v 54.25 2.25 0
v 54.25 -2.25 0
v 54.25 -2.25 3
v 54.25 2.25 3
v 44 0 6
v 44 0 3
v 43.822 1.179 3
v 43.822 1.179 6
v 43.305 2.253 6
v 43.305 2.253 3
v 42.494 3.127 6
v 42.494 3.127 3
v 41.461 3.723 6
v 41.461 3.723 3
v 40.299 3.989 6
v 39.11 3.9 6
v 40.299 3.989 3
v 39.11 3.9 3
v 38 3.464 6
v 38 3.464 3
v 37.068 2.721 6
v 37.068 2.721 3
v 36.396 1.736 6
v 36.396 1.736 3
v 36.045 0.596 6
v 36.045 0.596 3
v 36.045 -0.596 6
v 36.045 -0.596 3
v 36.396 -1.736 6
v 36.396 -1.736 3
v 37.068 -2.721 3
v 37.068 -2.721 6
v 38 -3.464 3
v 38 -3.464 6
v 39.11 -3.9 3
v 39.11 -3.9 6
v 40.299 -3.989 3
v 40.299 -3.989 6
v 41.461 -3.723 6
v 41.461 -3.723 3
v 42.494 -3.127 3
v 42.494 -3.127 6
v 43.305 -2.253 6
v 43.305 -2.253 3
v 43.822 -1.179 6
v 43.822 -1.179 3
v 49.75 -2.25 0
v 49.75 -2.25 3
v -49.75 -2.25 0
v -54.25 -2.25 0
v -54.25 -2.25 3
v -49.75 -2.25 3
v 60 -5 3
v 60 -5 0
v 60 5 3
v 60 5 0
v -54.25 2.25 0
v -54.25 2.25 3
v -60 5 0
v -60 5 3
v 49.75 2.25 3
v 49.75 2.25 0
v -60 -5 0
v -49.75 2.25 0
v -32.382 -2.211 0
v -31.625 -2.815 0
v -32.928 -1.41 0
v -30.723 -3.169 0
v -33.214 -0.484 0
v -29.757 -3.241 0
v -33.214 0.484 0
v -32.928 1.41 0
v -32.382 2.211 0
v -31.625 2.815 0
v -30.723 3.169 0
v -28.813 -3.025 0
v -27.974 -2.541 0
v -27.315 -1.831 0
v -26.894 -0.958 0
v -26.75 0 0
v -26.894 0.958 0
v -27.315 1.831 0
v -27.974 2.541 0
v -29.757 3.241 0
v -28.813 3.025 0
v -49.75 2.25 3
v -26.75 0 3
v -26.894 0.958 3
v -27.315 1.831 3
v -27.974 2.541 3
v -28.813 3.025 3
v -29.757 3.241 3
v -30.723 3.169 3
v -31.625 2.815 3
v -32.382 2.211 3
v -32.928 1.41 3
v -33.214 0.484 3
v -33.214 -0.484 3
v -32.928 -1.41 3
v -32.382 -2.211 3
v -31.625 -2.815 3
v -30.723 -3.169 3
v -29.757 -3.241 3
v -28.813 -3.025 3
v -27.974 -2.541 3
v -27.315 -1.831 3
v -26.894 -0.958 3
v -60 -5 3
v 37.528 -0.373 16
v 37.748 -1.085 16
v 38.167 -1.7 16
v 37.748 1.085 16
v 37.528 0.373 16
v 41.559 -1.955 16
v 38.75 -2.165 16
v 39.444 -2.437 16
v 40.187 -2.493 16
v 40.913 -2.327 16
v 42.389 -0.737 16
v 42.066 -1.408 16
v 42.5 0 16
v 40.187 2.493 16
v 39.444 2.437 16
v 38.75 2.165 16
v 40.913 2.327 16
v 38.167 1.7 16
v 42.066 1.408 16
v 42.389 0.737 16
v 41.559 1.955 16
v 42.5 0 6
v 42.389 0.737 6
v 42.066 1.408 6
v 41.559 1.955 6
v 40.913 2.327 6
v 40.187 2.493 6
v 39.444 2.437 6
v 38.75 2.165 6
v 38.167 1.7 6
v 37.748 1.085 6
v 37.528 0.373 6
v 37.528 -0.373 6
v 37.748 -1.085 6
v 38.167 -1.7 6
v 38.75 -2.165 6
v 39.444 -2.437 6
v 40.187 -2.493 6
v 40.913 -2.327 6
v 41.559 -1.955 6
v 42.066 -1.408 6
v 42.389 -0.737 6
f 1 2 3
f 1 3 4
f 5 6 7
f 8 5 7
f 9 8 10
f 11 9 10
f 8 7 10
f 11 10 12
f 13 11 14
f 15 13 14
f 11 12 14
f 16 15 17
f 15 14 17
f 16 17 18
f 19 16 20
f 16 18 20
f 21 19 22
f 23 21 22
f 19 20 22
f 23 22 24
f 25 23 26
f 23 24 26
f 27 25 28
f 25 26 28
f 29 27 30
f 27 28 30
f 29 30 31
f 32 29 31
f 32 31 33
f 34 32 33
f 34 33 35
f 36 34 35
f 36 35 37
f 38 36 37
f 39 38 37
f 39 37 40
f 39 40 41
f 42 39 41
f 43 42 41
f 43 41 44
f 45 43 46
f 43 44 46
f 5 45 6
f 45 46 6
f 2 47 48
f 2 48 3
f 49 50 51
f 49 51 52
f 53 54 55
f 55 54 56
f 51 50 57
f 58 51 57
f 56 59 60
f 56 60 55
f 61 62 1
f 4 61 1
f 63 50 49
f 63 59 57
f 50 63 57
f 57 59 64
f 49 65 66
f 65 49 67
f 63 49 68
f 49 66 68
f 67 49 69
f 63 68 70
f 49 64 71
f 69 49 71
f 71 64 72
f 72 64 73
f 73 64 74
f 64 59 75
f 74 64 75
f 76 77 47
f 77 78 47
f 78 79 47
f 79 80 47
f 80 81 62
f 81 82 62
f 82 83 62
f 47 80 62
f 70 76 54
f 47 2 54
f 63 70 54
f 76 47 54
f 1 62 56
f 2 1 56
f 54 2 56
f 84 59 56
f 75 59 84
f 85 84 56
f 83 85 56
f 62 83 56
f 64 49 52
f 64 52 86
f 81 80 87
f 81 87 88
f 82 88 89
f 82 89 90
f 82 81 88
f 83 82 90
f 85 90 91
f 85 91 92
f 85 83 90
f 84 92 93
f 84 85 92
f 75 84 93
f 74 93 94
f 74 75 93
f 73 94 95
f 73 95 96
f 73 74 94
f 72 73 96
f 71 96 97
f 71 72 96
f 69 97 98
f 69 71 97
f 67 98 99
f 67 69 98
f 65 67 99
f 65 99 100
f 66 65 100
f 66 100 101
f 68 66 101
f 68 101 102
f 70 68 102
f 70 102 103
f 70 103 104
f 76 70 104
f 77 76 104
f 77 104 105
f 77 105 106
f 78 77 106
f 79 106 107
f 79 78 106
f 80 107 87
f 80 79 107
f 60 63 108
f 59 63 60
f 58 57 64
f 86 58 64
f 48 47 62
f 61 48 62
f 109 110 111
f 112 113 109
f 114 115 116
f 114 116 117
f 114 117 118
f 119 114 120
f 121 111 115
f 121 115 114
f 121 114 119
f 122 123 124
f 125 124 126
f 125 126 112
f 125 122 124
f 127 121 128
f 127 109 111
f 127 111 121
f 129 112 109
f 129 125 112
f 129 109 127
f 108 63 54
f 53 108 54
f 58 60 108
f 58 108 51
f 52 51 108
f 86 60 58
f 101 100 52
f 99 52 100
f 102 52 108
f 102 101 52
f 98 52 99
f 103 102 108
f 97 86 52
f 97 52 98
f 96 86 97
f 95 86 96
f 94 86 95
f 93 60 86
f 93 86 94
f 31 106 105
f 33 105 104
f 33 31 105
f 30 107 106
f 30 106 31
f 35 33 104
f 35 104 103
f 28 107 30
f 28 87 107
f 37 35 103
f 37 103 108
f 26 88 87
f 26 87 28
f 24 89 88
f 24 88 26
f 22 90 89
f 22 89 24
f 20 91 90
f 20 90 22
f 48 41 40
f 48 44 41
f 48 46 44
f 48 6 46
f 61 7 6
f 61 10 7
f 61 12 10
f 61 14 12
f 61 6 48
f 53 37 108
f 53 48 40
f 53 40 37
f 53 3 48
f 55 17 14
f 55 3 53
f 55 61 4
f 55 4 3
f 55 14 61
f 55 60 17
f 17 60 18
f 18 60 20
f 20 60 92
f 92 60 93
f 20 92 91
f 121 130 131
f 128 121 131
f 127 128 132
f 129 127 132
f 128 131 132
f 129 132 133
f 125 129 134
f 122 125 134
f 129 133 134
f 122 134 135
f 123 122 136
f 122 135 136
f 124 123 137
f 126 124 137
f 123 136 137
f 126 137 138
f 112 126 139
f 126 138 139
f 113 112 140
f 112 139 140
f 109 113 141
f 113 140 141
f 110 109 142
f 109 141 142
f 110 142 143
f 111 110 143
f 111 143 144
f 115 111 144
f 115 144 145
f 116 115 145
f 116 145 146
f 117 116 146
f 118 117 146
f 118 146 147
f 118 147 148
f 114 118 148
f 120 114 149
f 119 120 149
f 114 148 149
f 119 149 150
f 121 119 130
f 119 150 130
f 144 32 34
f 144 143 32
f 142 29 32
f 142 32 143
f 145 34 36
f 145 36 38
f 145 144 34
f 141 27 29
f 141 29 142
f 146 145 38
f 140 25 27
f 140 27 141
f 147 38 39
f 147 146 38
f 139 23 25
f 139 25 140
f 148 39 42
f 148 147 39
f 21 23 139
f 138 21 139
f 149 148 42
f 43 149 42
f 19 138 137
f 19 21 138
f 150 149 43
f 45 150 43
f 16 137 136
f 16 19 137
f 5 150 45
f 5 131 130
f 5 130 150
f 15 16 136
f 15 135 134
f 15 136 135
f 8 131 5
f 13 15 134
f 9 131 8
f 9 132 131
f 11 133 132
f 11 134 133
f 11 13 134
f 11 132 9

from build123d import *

# Parameters (mm, degrees)
F0_W     = 120
F0_H     = 10
F0_W_2   = 4.5
F0_H_2   = 4.5
F0_R     = 3.25
F1_DEPTH = 3
F2_R     = 4
F3_DEPTH = 3
F4_R     = 2.5
F5_DEPTH = 10


with BuildPart() as f1:
    # F0 (on Top) → F1 (new body)
    with BuildSketch(Plane.XY):
        Rectangle(F0_W, F0_H)
        with Locations((-52, 0)):
            Rectangle(F0_W_2, F0_H_2, mode=Mode.SUBTRACT)
        with Locations((-30, 0)):
            Circle(F0_R, mode=Mode.SUBTRACT)
        with Locations((52, 0)):
            Rectangle(F0_W_2, F0_H_2, mode=Mode.SUBTRACT)
    extrude(amount=F1_DEPTH)

    # F2 (on face) → F3 (join)
    with BuildSketch(Plane.XY.offset(3)):
        with Locations((40, 0)):
            Circle(F2_R)
    extrude(amount=F3_DEPTH)

    # F4 (on face) → F5 (join)
    with BuildSketch(Plane.XY.offset(6)):
        with Locations((40, 0)):
            Circle(F4_R)
    extrude(amount=F5_DEPTH)


solid = f1.part
